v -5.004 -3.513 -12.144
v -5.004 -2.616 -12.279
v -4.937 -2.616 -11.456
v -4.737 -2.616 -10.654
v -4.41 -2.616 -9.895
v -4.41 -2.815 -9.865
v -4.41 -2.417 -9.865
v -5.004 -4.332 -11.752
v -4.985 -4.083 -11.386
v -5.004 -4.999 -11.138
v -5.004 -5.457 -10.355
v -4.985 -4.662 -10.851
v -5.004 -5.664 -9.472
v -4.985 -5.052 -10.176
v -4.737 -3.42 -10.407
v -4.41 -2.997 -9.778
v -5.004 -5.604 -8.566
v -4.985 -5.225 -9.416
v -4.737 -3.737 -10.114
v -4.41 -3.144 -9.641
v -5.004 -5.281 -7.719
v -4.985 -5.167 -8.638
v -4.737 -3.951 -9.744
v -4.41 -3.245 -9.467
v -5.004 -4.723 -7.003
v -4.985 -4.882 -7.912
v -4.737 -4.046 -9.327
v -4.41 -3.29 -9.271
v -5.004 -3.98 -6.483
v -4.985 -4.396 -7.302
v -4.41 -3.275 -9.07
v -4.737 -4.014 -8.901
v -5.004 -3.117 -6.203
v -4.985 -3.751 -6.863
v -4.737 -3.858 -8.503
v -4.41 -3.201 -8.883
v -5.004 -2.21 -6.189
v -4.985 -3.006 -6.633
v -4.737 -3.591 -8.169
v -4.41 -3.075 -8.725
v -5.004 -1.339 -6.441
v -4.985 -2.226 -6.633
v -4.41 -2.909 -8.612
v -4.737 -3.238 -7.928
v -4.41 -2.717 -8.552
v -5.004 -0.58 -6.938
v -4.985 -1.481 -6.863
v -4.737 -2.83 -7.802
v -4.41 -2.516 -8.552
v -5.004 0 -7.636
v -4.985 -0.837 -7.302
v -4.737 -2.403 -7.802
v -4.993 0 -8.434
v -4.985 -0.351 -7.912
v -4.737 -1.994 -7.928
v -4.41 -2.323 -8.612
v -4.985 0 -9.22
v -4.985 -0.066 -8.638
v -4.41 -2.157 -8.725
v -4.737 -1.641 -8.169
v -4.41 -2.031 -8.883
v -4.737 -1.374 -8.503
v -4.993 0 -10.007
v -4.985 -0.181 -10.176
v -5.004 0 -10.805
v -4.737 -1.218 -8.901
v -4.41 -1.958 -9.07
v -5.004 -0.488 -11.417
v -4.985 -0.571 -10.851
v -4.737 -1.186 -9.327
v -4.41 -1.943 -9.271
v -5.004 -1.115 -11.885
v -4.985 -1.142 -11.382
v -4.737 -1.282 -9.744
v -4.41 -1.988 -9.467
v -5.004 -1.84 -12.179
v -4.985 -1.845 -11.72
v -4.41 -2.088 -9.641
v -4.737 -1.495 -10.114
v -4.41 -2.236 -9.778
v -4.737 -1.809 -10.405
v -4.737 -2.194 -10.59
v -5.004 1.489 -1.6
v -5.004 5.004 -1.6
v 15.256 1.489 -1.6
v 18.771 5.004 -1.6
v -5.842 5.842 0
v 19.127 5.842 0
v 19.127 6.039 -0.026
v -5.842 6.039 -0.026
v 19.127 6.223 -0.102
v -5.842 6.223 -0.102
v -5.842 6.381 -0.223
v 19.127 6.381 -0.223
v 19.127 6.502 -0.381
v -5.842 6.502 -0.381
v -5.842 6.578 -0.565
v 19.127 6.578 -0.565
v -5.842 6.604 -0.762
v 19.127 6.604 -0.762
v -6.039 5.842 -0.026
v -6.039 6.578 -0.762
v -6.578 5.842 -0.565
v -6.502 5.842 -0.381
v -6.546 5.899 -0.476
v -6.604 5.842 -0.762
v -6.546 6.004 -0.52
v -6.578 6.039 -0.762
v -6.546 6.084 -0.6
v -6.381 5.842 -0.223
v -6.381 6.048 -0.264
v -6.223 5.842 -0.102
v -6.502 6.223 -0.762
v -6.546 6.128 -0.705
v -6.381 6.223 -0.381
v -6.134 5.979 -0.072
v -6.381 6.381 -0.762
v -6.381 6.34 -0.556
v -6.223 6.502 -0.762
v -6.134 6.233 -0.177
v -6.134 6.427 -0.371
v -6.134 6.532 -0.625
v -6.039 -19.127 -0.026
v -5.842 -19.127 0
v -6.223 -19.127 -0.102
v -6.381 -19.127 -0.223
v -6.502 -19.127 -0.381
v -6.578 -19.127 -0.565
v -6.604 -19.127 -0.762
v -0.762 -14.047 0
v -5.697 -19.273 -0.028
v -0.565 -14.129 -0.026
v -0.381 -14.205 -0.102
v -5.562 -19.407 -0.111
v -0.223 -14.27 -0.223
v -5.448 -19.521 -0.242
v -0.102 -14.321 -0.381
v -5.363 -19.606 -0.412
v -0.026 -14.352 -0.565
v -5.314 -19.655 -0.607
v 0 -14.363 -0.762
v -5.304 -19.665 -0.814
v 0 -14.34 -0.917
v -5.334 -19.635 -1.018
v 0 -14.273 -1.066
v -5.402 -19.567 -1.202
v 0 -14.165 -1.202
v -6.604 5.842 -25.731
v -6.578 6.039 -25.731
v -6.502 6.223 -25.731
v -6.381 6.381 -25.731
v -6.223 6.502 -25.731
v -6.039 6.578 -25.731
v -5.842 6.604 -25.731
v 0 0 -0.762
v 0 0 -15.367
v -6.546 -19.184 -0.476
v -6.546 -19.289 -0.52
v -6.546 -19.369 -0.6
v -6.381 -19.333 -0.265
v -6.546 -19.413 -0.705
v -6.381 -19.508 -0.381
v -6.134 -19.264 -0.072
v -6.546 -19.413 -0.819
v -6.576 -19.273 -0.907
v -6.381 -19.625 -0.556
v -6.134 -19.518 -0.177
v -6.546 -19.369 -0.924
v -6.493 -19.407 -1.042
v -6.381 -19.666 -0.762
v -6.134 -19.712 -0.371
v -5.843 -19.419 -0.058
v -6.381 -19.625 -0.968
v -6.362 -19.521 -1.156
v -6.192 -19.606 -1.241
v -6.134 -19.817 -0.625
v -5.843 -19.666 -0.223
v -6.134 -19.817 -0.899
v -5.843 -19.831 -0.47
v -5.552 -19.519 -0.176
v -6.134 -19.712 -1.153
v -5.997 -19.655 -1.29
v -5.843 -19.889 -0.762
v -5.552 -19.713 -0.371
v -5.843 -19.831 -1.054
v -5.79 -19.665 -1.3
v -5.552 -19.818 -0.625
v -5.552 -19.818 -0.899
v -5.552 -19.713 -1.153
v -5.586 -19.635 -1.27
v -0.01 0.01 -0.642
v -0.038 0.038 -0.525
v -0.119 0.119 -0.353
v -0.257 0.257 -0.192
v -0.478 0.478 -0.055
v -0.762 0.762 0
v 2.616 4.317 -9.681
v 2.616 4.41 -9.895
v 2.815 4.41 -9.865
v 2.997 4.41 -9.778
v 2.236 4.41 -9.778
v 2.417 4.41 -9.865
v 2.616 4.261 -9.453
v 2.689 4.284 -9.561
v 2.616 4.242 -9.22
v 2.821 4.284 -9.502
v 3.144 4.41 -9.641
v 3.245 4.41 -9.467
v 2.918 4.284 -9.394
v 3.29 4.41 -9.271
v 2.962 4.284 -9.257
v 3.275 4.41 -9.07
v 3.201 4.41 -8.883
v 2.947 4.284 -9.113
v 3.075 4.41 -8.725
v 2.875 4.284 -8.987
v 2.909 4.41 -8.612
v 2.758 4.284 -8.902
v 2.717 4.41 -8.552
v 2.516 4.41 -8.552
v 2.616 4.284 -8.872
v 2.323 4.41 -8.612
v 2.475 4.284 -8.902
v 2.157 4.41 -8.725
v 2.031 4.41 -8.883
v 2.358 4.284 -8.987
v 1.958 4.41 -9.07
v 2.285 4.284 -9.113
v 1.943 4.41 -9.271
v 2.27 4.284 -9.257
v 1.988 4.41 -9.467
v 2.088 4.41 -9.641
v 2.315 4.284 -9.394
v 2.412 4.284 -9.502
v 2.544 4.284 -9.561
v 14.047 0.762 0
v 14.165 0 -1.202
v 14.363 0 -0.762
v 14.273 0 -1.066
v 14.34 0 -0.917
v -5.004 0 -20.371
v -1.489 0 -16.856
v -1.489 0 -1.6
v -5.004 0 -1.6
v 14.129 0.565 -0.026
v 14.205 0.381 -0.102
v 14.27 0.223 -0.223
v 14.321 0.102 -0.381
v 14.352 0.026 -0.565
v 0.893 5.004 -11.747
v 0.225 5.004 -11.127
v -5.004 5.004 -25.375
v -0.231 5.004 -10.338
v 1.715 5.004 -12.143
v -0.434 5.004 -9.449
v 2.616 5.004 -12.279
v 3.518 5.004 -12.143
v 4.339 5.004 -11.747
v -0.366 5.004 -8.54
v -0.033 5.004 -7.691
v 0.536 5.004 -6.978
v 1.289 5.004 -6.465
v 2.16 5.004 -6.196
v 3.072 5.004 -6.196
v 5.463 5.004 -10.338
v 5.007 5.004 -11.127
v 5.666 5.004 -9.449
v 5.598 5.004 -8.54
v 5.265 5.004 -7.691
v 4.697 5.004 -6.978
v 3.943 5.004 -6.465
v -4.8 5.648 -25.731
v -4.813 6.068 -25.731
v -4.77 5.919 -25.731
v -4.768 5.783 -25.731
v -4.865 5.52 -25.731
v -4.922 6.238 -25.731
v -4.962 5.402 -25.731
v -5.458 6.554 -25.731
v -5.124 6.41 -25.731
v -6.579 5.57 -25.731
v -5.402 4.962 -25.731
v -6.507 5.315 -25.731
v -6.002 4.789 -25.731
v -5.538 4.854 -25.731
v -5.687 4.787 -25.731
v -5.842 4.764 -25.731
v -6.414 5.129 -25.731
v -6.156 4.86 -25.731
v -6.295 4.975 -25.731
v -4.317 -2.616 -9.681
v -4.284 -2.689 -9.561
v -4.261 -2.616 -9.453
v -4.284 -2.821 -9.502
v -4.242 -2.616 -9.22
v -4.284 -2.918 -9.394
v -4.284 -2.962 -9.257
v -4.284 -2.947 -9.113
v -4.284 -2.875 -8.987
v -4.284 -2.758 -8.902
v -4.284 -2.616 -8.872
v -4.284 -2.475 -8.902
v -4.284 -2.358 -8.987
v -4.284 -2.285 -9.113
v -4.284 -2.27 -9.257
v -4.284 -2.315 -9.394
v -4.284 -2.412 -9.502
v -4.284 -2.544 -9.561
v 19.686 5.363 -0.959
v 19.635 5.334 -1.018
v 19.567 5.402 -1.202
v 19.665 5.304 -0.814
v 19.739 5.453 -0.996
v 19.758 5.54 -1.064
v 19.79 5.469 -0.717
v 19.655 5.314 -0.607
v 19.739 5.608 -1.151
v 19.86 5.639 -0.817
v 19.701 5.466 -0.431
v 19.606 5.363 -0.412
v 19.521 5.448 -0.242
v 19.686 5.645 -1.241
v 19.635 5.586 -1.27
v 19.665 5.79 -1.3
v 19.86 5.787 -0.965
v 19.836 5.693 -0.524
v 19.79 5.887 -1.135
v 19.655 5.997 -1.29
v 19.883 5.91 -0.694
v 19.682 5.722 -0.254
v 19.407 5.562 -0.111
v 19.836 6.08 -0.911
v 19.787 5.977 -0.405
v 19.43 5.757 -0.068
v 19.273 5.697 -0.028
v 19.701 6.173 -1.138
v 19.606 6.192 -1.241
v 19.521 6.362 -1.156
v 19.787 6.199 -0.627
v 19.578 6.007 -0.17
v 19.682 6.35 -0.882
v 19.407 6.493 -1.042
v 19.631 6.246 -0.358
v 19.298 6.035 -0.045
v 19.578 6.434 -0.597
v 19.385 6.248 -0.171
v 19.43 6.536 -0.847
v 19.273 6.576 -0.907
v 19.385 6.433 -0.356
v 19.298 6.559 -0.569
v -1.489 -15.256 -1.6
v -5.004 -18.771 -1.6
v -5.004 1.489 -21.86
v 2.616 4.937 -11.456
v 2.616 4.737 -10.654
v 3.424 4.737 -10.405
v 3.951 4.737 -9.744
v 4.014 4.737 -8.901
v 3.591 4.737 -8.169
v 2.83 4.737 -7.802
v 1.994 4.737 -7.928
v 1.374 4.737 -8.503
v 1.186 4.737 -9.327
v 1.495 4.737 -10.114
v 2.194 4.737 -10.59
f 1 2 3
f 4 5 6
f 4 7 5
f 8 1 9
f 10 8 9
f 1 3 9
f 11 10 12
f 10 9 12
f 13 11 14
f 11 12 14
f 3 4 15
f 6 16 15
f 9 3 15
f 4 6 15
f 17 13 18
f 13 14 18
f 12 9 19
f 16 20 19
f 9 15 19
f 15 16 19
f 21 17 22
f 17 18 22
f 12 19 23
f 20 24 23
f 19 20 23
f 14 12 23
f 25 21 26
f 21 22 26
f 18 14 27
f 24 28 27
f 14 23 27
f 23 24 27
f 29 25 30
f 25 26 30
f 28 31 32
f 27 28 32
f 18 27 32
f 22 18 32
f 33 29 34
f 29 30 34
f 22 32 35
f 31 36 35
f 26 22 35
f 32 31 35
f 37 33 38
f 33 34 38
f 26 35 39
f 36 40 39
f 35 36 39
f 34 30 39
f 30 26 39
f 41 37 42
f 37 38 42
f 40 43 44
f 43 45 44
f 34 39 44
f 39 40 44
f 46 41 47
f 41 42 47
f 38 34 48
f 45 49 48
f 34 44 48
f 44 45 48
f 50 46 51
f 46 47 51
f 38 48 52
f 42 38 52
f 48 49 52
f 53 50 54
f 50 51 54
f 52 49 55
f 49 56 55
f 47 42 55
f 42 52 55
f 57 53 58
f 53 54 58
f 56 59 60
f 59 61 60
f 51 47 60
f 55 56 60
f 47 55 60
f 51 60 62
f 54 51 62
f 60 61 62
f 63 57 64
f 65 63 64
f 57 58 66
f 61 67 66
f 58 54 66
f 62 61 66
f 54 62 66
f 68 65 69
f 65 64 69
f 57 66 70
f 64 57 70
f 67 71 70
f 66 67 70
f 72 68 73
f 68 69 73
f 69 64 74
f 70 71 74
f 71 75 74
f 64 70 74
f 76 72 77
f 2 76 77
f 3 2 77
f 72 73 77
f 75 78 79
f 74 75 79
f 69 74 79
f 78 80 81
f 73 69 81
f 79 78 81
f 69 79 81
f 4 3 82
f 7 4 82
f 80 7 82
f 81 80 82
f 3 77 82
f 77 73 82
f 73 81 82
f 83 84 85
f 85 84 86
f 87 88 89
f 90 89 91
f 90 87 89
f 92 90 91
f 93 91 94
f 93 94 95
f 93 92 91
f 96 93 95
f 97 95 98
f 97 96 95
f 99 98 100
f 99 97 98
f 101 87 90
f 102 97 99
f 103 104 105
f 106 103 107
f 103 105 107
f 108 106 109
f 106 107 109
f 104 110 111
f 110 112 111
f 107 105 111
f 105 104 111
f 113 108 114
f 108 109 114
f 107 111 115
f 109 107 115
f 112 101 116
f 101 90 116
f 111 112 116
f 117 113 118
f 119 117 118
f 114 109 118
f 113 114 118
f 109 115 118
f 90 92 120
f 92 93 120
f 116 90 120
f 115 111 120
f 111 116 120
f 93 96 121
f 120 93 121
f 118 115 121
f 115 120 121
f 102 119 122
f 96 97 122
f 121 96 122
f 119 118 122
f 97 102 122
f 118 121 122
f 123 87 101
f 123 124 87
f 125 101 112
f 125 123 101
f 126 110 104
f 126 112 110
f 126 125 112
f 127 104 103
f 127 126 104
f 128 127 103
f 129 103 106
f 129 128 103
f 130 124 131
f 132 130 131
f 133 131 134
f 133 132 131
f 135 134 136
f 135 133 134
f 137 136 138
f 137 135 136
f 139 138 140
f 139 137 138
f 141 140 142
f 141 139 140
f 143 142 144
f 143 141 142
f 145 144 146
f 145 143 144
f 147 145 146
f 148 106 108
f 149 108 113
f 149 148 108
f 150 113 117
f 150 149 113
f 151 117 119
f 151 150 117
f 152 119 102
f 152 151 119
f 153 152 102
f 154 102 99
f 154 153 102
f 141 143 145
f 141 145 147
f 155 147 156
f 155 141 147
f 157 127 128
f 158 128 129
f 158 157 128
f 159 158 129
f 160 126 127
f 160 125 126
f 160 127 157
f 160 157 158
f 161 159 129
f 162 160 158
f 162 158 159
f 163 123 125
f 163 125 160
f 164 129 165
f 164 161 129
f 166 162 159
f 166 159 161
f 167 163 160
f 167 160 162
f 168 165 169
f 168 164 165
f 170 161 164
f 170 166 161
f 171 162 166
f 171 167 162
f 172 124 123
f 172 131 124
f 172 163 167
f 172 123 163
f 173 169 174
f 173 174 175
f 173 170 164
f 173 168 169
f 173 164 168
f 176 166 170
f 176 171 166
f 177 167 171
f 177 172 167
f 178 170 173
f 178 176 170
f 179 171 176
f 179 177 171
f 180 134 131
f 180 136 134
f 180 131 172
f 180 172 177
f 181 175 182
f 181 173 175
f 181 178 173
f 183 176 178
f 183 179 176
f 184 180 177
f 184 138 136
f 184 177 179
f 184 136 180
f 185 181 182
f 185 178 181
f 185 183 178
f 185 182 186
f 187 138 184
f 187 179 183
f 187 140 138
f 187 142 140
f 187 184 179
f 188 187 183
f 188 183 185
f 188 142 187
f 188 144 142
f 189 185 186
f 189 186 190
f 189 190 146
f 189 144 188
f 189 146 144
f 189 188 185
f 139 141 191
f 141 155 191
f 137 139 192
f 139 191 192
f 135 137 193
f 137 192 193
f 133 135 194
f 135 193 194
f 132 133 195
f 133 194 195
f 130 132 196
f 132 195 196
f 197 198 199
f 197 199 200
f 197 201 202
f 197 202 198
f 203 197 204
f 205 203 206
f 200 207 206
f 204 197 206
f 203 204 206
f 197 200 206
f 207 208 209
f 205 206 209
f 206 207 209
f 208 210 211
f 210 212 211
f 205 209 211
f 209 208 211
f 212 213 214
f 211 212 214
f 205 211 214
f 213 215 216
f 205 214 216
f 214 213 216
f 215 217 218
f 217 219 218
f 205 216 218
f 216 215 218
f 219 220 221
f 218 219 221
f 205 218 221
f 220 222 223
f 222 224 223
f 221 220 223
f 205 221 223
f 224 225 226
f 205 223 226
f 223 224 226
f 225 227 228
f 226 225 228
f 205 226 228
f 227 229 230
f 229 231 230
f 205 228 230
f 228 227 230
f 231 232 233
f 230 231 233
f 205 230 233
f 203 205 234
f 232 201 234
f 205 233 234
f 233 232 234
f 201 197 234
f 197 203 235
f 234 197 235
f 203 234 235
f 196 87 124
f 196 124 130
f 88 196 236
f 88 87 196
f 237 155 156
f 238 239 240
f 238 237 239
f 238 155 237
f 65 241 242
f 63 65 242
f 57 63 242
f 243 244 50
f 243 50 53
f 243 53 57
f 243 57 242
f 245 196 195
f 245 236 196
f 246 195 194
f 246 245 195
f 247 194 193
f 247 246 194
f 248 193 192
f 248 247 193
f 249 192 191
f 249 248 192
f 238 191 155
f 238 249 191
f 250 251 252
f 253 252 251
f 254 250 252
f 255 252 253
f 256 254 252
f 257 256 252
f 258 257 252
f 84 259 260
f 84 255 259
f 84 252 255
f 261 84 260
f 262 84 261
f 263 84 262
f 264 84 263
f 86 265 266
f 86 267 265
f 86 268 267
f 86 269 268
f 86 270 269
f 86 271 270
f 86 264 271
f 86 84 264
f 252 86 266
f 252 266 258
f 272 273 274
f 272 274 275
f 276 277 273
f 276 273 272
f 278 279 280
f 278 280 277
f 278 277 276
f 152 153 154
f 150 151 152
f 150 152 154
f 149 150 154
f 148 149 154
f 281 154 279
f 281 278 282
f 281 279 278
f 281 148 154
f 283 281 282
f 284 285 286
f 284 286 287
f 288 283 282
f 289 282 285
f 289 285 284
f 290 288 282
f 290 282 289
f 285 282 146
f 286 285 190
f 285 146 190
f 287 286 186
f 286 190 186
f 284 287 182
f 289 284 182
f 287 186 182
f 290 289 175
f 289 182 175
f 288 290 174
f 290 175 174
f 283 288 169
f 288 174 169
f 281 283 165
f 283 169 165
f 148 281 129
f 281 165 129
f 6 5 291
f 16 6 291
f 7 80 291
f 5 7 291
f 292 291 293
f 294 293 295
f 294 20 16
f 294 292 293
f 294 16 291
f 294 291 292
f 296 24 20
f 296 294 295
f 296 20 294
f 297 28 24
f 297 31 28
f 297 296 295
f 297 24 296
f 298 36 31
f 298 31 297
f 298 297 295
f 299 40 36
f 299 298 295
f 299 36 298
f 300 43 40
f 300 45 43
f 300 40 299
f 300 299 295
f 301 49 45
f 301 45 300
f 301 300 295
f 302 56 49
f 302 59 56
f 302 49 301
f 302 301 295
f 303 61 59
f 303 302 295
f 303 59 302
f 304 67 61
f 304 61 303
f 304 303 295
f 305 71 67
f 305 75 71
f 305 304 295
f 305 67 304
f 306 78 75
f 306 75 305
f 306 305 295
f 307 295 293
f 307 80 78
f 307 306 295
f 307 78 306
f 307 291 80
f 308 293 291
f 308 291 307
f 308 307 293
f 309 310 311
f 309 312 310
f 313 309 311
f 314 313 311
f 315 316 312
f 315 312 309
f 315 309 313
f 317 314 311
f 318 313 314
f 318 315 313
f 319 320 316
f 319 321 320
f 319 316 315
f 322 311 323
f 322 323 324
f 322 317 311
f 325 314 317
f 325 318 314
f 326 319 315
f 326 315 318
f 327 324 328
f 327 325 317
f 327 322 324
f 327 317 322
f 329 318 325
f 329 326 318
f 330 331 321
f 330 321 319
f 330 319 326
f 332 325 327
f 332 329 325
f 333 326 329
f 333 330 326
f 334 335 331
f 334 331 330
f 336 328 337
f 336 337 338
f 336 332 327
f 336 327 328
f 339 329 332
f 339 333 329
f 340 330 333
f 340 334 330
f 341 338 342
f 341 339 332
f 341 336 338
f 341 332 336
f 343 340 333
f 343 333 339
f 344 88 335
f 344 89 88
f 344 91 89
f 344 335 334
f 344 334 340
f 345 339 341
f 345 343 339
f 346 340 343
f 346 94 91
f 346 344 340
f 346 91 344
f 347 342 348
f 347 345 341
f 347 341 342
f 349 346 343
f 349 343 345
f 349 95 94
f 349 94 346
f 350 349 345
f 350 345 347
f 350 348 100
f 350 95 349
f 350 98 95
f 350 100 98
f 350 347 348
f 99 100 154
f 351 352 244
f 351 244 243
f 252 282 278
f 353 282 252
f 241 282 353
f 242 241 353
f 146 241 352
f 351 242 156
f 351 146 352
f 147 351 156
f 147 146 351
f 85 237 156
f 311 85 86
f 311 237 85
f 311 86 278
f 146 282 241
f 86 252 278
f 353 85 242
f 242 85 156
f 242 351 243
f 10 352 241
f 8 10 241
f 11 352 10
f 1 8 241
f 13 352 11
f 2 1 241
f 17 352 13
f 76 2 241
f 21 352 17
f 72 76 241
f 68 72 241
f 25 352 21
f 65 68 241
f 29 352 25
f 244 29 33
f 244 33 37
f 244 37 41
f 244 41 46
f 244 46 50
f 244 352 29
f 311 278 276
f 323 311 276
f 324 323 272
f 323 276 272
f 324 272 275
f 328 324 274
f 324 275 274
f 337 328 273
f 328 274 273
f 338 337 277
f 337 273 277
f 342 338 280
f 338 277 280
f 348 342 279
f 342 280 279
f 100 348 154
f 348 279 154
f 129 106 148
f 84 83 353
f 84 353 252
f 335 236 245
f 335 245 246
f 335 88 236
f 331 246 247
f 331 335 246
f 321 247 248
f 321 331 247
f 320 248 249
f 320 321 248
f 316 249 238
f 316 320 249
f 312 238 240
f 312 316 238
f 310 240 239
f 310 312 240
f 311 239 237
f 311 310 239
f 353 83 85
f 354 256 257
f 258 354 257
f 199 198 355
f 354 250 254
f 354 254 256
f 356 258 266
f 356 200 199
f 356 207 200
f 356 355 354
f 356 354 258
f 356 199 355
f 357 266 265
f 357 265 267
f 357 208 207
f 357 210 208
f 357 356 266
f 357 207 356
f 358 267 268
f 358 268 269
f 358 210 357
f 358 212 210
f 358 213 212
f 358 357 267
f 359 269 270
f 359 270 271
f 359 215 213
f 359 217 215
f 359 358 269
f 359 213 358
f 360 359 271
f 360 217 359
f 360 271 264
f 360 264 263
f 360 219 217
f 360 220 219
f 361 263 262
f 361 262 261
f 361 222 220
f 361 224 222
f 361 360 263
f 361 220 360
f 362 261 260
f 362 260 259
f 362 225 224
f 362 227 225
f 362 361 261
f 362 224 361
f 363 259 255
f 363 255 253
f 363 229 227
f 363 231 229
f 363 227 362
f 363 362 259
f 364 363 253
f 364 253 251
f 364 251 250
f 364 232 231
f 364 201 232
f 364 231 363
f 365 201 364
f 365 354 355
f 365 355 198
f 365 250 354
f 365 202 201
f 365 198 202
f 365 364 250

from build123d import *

# Parameters (mm, degrees)
F1_DEPTH  = 28.575
F3_R      = 38.1
F4_DEPTH  = 32.9965678842
F6_W      = 26.9748
F6_H      = 3.5145800794
F6_W_2    = 3.5145800794
F6_H_2    = 21.971
F7_DEPTH  = 26.9758
F8_R      = 0.762
F15_W     = 1.8396307345
F15_H     = 1.8396307345
F16_DEPTH = 26.4941772846


# Not quite as in the source:
# - a fillet or chamfer that OpenCascade refuses, or shapes differently, is made with other operations: its cross-section is extruded or revolved along the edge and cut away or added
# - a pattern or mirror of a feature is missing from the dataset's text; its kind, count and spacing are read off the source's solid


with BuildPart() as f1:
    # F0 (on Top) → F1 (new body)
    with BuildSketch(Plane.XY):
        Polygon((0, -21.971), (0, 0), (21.971, 0), (21.971, 6.604), (-6.604, 6.604), (-6.604, -21.971), align=None)
    extrude(amount=-F1_DEPTH)

    # F3 (on 3pt) → F4 (cut, through all)
    with BuildSketch(Plane(origin=(5.1223333333, -5.1223333333, -5.1223333333), x_dir=(0.8164965809, 0.4082482905, 0.4082482905), z_dir=(0.5773502692, -0.5773502692, -0.5773502692))):
        Circle(F3_R)
    extrude(amount=F4_DEPTH, mode=Mode.SUBTRACT)

    # F6 (on offset) → F7 (cut, through all)
    with BuildSketch(Plane.XY.offset(-1.6002)):
        with Locations((8.4836, 3.2465099603)):
            Rectangle(F6_W, F6_H)
        with Locations((-3.2465099603, -10.9855)):
            Rectangle(F6_W_2, F6_H_2)
    extrude(amount=-F7_DEPTH, mode=Mode.SUBTRACT)

    # F8
    f8_edges = [f1.edges().sort_by_distance(p)[0] for p in [
        (7.6835, 6.604, 0),
        (18.669, 3.302, 0),
        (7.6835, 0, 0),
        (0, -7.6835, 0),
        (-3.302, -18.669, 0),
        (-6.604, -7.6835, 0),
        (-6.604, 6.604, -14.2875),
        (7.6835, 6.604, -14.2875),
        (-6.604, -7.6835, -14.2875),
    ]]
    fillet(f8_edges, radius=F8_R)

    # F10 (on offset) → F11 (revolve)
    with BuildSketch(Plane.YZ.offset(2.6162)):
        with BuildLine():
            ThreePointArc((4.2418, -9.2202), (4.4469151823, -9.9607308906), (5.0038, -10.4902))
            Line((5.0038, -10.4902), (5.0038, -9.2202))
            Line((5.0038, -9.2202), (4.2418, -9.2202))
        make_face()
    f11 = revolve(axis=Axis((2.6162, 4.6228, -9.2202), (0, -1, 0)))

    # F11_copies: F11 across plane
    add(f11.mirror(Plane(origin=(0, 0, 0), x_dir=(0.7071067796, -0.7071067828, 0), z_dir=(-0.7071067828, -0.7071067796, 0))))

    # F14: fillet of radius 5.08 on 3 edges, made by hand

    # F14_s1 → F14_t2 (revolve)
    with BuildSketch(Plane.YZ.offset(2.6162)):
        with BuildLine():
            ThreePointArc((5.0038, -12.278765023), (4.853123865, -11.0506908258), (4.4100337662, -9.8954676025))
            ThreePointArc((4.4100337662, -9.8954676025), (4.662543942, -10.2371346569), (5.0038, -10.4902))
            Line((5.0038, -10.4902), (5.0038, -12.278765023))
        make_face()
    revolve(axis=Axis((2.6162, 5.0038, -9.2202), (0, -1, 0)))

    # F14_s3 → F14_t4 (revolve)
    with BuildSketch(Plane.XZ.offset(2.6161999777)):
        with BuildLine():
            ThreePointArc((-5.0038, -12.2787650011), (-4.8531238674, -11.0506908133), (-4.4100337753, -9.8954675976))
            ThreePointArc((-4.4100337753, -9.8954675976), (-4.6625439517, -10.237134655), (-5.0038000116, -10.4902))
            Line((-5.0038000116, -10.4902), (-5.0038, -12.2787650011))
        make_face()
    revolve(axis=Axis((-5.0038000116, -2.6161999777, -9.2202), (-1, 4.4e-09, 0)))

    # F15 (on face) → F16 (cut, through all)
    with BuildSketch(Plane(origin=(-6.604, 0, 0), x_dir=(0, -1, 0), z_dir=(-1, 0, 0))):
        with Locations((-5.6841846327, -26.6509926519)):
            Rectangle(F15_W, F15_H)
    extrude(amount=-F16_DEPTH, mode=Mode.SUBTRACT)


solid = f1.part
